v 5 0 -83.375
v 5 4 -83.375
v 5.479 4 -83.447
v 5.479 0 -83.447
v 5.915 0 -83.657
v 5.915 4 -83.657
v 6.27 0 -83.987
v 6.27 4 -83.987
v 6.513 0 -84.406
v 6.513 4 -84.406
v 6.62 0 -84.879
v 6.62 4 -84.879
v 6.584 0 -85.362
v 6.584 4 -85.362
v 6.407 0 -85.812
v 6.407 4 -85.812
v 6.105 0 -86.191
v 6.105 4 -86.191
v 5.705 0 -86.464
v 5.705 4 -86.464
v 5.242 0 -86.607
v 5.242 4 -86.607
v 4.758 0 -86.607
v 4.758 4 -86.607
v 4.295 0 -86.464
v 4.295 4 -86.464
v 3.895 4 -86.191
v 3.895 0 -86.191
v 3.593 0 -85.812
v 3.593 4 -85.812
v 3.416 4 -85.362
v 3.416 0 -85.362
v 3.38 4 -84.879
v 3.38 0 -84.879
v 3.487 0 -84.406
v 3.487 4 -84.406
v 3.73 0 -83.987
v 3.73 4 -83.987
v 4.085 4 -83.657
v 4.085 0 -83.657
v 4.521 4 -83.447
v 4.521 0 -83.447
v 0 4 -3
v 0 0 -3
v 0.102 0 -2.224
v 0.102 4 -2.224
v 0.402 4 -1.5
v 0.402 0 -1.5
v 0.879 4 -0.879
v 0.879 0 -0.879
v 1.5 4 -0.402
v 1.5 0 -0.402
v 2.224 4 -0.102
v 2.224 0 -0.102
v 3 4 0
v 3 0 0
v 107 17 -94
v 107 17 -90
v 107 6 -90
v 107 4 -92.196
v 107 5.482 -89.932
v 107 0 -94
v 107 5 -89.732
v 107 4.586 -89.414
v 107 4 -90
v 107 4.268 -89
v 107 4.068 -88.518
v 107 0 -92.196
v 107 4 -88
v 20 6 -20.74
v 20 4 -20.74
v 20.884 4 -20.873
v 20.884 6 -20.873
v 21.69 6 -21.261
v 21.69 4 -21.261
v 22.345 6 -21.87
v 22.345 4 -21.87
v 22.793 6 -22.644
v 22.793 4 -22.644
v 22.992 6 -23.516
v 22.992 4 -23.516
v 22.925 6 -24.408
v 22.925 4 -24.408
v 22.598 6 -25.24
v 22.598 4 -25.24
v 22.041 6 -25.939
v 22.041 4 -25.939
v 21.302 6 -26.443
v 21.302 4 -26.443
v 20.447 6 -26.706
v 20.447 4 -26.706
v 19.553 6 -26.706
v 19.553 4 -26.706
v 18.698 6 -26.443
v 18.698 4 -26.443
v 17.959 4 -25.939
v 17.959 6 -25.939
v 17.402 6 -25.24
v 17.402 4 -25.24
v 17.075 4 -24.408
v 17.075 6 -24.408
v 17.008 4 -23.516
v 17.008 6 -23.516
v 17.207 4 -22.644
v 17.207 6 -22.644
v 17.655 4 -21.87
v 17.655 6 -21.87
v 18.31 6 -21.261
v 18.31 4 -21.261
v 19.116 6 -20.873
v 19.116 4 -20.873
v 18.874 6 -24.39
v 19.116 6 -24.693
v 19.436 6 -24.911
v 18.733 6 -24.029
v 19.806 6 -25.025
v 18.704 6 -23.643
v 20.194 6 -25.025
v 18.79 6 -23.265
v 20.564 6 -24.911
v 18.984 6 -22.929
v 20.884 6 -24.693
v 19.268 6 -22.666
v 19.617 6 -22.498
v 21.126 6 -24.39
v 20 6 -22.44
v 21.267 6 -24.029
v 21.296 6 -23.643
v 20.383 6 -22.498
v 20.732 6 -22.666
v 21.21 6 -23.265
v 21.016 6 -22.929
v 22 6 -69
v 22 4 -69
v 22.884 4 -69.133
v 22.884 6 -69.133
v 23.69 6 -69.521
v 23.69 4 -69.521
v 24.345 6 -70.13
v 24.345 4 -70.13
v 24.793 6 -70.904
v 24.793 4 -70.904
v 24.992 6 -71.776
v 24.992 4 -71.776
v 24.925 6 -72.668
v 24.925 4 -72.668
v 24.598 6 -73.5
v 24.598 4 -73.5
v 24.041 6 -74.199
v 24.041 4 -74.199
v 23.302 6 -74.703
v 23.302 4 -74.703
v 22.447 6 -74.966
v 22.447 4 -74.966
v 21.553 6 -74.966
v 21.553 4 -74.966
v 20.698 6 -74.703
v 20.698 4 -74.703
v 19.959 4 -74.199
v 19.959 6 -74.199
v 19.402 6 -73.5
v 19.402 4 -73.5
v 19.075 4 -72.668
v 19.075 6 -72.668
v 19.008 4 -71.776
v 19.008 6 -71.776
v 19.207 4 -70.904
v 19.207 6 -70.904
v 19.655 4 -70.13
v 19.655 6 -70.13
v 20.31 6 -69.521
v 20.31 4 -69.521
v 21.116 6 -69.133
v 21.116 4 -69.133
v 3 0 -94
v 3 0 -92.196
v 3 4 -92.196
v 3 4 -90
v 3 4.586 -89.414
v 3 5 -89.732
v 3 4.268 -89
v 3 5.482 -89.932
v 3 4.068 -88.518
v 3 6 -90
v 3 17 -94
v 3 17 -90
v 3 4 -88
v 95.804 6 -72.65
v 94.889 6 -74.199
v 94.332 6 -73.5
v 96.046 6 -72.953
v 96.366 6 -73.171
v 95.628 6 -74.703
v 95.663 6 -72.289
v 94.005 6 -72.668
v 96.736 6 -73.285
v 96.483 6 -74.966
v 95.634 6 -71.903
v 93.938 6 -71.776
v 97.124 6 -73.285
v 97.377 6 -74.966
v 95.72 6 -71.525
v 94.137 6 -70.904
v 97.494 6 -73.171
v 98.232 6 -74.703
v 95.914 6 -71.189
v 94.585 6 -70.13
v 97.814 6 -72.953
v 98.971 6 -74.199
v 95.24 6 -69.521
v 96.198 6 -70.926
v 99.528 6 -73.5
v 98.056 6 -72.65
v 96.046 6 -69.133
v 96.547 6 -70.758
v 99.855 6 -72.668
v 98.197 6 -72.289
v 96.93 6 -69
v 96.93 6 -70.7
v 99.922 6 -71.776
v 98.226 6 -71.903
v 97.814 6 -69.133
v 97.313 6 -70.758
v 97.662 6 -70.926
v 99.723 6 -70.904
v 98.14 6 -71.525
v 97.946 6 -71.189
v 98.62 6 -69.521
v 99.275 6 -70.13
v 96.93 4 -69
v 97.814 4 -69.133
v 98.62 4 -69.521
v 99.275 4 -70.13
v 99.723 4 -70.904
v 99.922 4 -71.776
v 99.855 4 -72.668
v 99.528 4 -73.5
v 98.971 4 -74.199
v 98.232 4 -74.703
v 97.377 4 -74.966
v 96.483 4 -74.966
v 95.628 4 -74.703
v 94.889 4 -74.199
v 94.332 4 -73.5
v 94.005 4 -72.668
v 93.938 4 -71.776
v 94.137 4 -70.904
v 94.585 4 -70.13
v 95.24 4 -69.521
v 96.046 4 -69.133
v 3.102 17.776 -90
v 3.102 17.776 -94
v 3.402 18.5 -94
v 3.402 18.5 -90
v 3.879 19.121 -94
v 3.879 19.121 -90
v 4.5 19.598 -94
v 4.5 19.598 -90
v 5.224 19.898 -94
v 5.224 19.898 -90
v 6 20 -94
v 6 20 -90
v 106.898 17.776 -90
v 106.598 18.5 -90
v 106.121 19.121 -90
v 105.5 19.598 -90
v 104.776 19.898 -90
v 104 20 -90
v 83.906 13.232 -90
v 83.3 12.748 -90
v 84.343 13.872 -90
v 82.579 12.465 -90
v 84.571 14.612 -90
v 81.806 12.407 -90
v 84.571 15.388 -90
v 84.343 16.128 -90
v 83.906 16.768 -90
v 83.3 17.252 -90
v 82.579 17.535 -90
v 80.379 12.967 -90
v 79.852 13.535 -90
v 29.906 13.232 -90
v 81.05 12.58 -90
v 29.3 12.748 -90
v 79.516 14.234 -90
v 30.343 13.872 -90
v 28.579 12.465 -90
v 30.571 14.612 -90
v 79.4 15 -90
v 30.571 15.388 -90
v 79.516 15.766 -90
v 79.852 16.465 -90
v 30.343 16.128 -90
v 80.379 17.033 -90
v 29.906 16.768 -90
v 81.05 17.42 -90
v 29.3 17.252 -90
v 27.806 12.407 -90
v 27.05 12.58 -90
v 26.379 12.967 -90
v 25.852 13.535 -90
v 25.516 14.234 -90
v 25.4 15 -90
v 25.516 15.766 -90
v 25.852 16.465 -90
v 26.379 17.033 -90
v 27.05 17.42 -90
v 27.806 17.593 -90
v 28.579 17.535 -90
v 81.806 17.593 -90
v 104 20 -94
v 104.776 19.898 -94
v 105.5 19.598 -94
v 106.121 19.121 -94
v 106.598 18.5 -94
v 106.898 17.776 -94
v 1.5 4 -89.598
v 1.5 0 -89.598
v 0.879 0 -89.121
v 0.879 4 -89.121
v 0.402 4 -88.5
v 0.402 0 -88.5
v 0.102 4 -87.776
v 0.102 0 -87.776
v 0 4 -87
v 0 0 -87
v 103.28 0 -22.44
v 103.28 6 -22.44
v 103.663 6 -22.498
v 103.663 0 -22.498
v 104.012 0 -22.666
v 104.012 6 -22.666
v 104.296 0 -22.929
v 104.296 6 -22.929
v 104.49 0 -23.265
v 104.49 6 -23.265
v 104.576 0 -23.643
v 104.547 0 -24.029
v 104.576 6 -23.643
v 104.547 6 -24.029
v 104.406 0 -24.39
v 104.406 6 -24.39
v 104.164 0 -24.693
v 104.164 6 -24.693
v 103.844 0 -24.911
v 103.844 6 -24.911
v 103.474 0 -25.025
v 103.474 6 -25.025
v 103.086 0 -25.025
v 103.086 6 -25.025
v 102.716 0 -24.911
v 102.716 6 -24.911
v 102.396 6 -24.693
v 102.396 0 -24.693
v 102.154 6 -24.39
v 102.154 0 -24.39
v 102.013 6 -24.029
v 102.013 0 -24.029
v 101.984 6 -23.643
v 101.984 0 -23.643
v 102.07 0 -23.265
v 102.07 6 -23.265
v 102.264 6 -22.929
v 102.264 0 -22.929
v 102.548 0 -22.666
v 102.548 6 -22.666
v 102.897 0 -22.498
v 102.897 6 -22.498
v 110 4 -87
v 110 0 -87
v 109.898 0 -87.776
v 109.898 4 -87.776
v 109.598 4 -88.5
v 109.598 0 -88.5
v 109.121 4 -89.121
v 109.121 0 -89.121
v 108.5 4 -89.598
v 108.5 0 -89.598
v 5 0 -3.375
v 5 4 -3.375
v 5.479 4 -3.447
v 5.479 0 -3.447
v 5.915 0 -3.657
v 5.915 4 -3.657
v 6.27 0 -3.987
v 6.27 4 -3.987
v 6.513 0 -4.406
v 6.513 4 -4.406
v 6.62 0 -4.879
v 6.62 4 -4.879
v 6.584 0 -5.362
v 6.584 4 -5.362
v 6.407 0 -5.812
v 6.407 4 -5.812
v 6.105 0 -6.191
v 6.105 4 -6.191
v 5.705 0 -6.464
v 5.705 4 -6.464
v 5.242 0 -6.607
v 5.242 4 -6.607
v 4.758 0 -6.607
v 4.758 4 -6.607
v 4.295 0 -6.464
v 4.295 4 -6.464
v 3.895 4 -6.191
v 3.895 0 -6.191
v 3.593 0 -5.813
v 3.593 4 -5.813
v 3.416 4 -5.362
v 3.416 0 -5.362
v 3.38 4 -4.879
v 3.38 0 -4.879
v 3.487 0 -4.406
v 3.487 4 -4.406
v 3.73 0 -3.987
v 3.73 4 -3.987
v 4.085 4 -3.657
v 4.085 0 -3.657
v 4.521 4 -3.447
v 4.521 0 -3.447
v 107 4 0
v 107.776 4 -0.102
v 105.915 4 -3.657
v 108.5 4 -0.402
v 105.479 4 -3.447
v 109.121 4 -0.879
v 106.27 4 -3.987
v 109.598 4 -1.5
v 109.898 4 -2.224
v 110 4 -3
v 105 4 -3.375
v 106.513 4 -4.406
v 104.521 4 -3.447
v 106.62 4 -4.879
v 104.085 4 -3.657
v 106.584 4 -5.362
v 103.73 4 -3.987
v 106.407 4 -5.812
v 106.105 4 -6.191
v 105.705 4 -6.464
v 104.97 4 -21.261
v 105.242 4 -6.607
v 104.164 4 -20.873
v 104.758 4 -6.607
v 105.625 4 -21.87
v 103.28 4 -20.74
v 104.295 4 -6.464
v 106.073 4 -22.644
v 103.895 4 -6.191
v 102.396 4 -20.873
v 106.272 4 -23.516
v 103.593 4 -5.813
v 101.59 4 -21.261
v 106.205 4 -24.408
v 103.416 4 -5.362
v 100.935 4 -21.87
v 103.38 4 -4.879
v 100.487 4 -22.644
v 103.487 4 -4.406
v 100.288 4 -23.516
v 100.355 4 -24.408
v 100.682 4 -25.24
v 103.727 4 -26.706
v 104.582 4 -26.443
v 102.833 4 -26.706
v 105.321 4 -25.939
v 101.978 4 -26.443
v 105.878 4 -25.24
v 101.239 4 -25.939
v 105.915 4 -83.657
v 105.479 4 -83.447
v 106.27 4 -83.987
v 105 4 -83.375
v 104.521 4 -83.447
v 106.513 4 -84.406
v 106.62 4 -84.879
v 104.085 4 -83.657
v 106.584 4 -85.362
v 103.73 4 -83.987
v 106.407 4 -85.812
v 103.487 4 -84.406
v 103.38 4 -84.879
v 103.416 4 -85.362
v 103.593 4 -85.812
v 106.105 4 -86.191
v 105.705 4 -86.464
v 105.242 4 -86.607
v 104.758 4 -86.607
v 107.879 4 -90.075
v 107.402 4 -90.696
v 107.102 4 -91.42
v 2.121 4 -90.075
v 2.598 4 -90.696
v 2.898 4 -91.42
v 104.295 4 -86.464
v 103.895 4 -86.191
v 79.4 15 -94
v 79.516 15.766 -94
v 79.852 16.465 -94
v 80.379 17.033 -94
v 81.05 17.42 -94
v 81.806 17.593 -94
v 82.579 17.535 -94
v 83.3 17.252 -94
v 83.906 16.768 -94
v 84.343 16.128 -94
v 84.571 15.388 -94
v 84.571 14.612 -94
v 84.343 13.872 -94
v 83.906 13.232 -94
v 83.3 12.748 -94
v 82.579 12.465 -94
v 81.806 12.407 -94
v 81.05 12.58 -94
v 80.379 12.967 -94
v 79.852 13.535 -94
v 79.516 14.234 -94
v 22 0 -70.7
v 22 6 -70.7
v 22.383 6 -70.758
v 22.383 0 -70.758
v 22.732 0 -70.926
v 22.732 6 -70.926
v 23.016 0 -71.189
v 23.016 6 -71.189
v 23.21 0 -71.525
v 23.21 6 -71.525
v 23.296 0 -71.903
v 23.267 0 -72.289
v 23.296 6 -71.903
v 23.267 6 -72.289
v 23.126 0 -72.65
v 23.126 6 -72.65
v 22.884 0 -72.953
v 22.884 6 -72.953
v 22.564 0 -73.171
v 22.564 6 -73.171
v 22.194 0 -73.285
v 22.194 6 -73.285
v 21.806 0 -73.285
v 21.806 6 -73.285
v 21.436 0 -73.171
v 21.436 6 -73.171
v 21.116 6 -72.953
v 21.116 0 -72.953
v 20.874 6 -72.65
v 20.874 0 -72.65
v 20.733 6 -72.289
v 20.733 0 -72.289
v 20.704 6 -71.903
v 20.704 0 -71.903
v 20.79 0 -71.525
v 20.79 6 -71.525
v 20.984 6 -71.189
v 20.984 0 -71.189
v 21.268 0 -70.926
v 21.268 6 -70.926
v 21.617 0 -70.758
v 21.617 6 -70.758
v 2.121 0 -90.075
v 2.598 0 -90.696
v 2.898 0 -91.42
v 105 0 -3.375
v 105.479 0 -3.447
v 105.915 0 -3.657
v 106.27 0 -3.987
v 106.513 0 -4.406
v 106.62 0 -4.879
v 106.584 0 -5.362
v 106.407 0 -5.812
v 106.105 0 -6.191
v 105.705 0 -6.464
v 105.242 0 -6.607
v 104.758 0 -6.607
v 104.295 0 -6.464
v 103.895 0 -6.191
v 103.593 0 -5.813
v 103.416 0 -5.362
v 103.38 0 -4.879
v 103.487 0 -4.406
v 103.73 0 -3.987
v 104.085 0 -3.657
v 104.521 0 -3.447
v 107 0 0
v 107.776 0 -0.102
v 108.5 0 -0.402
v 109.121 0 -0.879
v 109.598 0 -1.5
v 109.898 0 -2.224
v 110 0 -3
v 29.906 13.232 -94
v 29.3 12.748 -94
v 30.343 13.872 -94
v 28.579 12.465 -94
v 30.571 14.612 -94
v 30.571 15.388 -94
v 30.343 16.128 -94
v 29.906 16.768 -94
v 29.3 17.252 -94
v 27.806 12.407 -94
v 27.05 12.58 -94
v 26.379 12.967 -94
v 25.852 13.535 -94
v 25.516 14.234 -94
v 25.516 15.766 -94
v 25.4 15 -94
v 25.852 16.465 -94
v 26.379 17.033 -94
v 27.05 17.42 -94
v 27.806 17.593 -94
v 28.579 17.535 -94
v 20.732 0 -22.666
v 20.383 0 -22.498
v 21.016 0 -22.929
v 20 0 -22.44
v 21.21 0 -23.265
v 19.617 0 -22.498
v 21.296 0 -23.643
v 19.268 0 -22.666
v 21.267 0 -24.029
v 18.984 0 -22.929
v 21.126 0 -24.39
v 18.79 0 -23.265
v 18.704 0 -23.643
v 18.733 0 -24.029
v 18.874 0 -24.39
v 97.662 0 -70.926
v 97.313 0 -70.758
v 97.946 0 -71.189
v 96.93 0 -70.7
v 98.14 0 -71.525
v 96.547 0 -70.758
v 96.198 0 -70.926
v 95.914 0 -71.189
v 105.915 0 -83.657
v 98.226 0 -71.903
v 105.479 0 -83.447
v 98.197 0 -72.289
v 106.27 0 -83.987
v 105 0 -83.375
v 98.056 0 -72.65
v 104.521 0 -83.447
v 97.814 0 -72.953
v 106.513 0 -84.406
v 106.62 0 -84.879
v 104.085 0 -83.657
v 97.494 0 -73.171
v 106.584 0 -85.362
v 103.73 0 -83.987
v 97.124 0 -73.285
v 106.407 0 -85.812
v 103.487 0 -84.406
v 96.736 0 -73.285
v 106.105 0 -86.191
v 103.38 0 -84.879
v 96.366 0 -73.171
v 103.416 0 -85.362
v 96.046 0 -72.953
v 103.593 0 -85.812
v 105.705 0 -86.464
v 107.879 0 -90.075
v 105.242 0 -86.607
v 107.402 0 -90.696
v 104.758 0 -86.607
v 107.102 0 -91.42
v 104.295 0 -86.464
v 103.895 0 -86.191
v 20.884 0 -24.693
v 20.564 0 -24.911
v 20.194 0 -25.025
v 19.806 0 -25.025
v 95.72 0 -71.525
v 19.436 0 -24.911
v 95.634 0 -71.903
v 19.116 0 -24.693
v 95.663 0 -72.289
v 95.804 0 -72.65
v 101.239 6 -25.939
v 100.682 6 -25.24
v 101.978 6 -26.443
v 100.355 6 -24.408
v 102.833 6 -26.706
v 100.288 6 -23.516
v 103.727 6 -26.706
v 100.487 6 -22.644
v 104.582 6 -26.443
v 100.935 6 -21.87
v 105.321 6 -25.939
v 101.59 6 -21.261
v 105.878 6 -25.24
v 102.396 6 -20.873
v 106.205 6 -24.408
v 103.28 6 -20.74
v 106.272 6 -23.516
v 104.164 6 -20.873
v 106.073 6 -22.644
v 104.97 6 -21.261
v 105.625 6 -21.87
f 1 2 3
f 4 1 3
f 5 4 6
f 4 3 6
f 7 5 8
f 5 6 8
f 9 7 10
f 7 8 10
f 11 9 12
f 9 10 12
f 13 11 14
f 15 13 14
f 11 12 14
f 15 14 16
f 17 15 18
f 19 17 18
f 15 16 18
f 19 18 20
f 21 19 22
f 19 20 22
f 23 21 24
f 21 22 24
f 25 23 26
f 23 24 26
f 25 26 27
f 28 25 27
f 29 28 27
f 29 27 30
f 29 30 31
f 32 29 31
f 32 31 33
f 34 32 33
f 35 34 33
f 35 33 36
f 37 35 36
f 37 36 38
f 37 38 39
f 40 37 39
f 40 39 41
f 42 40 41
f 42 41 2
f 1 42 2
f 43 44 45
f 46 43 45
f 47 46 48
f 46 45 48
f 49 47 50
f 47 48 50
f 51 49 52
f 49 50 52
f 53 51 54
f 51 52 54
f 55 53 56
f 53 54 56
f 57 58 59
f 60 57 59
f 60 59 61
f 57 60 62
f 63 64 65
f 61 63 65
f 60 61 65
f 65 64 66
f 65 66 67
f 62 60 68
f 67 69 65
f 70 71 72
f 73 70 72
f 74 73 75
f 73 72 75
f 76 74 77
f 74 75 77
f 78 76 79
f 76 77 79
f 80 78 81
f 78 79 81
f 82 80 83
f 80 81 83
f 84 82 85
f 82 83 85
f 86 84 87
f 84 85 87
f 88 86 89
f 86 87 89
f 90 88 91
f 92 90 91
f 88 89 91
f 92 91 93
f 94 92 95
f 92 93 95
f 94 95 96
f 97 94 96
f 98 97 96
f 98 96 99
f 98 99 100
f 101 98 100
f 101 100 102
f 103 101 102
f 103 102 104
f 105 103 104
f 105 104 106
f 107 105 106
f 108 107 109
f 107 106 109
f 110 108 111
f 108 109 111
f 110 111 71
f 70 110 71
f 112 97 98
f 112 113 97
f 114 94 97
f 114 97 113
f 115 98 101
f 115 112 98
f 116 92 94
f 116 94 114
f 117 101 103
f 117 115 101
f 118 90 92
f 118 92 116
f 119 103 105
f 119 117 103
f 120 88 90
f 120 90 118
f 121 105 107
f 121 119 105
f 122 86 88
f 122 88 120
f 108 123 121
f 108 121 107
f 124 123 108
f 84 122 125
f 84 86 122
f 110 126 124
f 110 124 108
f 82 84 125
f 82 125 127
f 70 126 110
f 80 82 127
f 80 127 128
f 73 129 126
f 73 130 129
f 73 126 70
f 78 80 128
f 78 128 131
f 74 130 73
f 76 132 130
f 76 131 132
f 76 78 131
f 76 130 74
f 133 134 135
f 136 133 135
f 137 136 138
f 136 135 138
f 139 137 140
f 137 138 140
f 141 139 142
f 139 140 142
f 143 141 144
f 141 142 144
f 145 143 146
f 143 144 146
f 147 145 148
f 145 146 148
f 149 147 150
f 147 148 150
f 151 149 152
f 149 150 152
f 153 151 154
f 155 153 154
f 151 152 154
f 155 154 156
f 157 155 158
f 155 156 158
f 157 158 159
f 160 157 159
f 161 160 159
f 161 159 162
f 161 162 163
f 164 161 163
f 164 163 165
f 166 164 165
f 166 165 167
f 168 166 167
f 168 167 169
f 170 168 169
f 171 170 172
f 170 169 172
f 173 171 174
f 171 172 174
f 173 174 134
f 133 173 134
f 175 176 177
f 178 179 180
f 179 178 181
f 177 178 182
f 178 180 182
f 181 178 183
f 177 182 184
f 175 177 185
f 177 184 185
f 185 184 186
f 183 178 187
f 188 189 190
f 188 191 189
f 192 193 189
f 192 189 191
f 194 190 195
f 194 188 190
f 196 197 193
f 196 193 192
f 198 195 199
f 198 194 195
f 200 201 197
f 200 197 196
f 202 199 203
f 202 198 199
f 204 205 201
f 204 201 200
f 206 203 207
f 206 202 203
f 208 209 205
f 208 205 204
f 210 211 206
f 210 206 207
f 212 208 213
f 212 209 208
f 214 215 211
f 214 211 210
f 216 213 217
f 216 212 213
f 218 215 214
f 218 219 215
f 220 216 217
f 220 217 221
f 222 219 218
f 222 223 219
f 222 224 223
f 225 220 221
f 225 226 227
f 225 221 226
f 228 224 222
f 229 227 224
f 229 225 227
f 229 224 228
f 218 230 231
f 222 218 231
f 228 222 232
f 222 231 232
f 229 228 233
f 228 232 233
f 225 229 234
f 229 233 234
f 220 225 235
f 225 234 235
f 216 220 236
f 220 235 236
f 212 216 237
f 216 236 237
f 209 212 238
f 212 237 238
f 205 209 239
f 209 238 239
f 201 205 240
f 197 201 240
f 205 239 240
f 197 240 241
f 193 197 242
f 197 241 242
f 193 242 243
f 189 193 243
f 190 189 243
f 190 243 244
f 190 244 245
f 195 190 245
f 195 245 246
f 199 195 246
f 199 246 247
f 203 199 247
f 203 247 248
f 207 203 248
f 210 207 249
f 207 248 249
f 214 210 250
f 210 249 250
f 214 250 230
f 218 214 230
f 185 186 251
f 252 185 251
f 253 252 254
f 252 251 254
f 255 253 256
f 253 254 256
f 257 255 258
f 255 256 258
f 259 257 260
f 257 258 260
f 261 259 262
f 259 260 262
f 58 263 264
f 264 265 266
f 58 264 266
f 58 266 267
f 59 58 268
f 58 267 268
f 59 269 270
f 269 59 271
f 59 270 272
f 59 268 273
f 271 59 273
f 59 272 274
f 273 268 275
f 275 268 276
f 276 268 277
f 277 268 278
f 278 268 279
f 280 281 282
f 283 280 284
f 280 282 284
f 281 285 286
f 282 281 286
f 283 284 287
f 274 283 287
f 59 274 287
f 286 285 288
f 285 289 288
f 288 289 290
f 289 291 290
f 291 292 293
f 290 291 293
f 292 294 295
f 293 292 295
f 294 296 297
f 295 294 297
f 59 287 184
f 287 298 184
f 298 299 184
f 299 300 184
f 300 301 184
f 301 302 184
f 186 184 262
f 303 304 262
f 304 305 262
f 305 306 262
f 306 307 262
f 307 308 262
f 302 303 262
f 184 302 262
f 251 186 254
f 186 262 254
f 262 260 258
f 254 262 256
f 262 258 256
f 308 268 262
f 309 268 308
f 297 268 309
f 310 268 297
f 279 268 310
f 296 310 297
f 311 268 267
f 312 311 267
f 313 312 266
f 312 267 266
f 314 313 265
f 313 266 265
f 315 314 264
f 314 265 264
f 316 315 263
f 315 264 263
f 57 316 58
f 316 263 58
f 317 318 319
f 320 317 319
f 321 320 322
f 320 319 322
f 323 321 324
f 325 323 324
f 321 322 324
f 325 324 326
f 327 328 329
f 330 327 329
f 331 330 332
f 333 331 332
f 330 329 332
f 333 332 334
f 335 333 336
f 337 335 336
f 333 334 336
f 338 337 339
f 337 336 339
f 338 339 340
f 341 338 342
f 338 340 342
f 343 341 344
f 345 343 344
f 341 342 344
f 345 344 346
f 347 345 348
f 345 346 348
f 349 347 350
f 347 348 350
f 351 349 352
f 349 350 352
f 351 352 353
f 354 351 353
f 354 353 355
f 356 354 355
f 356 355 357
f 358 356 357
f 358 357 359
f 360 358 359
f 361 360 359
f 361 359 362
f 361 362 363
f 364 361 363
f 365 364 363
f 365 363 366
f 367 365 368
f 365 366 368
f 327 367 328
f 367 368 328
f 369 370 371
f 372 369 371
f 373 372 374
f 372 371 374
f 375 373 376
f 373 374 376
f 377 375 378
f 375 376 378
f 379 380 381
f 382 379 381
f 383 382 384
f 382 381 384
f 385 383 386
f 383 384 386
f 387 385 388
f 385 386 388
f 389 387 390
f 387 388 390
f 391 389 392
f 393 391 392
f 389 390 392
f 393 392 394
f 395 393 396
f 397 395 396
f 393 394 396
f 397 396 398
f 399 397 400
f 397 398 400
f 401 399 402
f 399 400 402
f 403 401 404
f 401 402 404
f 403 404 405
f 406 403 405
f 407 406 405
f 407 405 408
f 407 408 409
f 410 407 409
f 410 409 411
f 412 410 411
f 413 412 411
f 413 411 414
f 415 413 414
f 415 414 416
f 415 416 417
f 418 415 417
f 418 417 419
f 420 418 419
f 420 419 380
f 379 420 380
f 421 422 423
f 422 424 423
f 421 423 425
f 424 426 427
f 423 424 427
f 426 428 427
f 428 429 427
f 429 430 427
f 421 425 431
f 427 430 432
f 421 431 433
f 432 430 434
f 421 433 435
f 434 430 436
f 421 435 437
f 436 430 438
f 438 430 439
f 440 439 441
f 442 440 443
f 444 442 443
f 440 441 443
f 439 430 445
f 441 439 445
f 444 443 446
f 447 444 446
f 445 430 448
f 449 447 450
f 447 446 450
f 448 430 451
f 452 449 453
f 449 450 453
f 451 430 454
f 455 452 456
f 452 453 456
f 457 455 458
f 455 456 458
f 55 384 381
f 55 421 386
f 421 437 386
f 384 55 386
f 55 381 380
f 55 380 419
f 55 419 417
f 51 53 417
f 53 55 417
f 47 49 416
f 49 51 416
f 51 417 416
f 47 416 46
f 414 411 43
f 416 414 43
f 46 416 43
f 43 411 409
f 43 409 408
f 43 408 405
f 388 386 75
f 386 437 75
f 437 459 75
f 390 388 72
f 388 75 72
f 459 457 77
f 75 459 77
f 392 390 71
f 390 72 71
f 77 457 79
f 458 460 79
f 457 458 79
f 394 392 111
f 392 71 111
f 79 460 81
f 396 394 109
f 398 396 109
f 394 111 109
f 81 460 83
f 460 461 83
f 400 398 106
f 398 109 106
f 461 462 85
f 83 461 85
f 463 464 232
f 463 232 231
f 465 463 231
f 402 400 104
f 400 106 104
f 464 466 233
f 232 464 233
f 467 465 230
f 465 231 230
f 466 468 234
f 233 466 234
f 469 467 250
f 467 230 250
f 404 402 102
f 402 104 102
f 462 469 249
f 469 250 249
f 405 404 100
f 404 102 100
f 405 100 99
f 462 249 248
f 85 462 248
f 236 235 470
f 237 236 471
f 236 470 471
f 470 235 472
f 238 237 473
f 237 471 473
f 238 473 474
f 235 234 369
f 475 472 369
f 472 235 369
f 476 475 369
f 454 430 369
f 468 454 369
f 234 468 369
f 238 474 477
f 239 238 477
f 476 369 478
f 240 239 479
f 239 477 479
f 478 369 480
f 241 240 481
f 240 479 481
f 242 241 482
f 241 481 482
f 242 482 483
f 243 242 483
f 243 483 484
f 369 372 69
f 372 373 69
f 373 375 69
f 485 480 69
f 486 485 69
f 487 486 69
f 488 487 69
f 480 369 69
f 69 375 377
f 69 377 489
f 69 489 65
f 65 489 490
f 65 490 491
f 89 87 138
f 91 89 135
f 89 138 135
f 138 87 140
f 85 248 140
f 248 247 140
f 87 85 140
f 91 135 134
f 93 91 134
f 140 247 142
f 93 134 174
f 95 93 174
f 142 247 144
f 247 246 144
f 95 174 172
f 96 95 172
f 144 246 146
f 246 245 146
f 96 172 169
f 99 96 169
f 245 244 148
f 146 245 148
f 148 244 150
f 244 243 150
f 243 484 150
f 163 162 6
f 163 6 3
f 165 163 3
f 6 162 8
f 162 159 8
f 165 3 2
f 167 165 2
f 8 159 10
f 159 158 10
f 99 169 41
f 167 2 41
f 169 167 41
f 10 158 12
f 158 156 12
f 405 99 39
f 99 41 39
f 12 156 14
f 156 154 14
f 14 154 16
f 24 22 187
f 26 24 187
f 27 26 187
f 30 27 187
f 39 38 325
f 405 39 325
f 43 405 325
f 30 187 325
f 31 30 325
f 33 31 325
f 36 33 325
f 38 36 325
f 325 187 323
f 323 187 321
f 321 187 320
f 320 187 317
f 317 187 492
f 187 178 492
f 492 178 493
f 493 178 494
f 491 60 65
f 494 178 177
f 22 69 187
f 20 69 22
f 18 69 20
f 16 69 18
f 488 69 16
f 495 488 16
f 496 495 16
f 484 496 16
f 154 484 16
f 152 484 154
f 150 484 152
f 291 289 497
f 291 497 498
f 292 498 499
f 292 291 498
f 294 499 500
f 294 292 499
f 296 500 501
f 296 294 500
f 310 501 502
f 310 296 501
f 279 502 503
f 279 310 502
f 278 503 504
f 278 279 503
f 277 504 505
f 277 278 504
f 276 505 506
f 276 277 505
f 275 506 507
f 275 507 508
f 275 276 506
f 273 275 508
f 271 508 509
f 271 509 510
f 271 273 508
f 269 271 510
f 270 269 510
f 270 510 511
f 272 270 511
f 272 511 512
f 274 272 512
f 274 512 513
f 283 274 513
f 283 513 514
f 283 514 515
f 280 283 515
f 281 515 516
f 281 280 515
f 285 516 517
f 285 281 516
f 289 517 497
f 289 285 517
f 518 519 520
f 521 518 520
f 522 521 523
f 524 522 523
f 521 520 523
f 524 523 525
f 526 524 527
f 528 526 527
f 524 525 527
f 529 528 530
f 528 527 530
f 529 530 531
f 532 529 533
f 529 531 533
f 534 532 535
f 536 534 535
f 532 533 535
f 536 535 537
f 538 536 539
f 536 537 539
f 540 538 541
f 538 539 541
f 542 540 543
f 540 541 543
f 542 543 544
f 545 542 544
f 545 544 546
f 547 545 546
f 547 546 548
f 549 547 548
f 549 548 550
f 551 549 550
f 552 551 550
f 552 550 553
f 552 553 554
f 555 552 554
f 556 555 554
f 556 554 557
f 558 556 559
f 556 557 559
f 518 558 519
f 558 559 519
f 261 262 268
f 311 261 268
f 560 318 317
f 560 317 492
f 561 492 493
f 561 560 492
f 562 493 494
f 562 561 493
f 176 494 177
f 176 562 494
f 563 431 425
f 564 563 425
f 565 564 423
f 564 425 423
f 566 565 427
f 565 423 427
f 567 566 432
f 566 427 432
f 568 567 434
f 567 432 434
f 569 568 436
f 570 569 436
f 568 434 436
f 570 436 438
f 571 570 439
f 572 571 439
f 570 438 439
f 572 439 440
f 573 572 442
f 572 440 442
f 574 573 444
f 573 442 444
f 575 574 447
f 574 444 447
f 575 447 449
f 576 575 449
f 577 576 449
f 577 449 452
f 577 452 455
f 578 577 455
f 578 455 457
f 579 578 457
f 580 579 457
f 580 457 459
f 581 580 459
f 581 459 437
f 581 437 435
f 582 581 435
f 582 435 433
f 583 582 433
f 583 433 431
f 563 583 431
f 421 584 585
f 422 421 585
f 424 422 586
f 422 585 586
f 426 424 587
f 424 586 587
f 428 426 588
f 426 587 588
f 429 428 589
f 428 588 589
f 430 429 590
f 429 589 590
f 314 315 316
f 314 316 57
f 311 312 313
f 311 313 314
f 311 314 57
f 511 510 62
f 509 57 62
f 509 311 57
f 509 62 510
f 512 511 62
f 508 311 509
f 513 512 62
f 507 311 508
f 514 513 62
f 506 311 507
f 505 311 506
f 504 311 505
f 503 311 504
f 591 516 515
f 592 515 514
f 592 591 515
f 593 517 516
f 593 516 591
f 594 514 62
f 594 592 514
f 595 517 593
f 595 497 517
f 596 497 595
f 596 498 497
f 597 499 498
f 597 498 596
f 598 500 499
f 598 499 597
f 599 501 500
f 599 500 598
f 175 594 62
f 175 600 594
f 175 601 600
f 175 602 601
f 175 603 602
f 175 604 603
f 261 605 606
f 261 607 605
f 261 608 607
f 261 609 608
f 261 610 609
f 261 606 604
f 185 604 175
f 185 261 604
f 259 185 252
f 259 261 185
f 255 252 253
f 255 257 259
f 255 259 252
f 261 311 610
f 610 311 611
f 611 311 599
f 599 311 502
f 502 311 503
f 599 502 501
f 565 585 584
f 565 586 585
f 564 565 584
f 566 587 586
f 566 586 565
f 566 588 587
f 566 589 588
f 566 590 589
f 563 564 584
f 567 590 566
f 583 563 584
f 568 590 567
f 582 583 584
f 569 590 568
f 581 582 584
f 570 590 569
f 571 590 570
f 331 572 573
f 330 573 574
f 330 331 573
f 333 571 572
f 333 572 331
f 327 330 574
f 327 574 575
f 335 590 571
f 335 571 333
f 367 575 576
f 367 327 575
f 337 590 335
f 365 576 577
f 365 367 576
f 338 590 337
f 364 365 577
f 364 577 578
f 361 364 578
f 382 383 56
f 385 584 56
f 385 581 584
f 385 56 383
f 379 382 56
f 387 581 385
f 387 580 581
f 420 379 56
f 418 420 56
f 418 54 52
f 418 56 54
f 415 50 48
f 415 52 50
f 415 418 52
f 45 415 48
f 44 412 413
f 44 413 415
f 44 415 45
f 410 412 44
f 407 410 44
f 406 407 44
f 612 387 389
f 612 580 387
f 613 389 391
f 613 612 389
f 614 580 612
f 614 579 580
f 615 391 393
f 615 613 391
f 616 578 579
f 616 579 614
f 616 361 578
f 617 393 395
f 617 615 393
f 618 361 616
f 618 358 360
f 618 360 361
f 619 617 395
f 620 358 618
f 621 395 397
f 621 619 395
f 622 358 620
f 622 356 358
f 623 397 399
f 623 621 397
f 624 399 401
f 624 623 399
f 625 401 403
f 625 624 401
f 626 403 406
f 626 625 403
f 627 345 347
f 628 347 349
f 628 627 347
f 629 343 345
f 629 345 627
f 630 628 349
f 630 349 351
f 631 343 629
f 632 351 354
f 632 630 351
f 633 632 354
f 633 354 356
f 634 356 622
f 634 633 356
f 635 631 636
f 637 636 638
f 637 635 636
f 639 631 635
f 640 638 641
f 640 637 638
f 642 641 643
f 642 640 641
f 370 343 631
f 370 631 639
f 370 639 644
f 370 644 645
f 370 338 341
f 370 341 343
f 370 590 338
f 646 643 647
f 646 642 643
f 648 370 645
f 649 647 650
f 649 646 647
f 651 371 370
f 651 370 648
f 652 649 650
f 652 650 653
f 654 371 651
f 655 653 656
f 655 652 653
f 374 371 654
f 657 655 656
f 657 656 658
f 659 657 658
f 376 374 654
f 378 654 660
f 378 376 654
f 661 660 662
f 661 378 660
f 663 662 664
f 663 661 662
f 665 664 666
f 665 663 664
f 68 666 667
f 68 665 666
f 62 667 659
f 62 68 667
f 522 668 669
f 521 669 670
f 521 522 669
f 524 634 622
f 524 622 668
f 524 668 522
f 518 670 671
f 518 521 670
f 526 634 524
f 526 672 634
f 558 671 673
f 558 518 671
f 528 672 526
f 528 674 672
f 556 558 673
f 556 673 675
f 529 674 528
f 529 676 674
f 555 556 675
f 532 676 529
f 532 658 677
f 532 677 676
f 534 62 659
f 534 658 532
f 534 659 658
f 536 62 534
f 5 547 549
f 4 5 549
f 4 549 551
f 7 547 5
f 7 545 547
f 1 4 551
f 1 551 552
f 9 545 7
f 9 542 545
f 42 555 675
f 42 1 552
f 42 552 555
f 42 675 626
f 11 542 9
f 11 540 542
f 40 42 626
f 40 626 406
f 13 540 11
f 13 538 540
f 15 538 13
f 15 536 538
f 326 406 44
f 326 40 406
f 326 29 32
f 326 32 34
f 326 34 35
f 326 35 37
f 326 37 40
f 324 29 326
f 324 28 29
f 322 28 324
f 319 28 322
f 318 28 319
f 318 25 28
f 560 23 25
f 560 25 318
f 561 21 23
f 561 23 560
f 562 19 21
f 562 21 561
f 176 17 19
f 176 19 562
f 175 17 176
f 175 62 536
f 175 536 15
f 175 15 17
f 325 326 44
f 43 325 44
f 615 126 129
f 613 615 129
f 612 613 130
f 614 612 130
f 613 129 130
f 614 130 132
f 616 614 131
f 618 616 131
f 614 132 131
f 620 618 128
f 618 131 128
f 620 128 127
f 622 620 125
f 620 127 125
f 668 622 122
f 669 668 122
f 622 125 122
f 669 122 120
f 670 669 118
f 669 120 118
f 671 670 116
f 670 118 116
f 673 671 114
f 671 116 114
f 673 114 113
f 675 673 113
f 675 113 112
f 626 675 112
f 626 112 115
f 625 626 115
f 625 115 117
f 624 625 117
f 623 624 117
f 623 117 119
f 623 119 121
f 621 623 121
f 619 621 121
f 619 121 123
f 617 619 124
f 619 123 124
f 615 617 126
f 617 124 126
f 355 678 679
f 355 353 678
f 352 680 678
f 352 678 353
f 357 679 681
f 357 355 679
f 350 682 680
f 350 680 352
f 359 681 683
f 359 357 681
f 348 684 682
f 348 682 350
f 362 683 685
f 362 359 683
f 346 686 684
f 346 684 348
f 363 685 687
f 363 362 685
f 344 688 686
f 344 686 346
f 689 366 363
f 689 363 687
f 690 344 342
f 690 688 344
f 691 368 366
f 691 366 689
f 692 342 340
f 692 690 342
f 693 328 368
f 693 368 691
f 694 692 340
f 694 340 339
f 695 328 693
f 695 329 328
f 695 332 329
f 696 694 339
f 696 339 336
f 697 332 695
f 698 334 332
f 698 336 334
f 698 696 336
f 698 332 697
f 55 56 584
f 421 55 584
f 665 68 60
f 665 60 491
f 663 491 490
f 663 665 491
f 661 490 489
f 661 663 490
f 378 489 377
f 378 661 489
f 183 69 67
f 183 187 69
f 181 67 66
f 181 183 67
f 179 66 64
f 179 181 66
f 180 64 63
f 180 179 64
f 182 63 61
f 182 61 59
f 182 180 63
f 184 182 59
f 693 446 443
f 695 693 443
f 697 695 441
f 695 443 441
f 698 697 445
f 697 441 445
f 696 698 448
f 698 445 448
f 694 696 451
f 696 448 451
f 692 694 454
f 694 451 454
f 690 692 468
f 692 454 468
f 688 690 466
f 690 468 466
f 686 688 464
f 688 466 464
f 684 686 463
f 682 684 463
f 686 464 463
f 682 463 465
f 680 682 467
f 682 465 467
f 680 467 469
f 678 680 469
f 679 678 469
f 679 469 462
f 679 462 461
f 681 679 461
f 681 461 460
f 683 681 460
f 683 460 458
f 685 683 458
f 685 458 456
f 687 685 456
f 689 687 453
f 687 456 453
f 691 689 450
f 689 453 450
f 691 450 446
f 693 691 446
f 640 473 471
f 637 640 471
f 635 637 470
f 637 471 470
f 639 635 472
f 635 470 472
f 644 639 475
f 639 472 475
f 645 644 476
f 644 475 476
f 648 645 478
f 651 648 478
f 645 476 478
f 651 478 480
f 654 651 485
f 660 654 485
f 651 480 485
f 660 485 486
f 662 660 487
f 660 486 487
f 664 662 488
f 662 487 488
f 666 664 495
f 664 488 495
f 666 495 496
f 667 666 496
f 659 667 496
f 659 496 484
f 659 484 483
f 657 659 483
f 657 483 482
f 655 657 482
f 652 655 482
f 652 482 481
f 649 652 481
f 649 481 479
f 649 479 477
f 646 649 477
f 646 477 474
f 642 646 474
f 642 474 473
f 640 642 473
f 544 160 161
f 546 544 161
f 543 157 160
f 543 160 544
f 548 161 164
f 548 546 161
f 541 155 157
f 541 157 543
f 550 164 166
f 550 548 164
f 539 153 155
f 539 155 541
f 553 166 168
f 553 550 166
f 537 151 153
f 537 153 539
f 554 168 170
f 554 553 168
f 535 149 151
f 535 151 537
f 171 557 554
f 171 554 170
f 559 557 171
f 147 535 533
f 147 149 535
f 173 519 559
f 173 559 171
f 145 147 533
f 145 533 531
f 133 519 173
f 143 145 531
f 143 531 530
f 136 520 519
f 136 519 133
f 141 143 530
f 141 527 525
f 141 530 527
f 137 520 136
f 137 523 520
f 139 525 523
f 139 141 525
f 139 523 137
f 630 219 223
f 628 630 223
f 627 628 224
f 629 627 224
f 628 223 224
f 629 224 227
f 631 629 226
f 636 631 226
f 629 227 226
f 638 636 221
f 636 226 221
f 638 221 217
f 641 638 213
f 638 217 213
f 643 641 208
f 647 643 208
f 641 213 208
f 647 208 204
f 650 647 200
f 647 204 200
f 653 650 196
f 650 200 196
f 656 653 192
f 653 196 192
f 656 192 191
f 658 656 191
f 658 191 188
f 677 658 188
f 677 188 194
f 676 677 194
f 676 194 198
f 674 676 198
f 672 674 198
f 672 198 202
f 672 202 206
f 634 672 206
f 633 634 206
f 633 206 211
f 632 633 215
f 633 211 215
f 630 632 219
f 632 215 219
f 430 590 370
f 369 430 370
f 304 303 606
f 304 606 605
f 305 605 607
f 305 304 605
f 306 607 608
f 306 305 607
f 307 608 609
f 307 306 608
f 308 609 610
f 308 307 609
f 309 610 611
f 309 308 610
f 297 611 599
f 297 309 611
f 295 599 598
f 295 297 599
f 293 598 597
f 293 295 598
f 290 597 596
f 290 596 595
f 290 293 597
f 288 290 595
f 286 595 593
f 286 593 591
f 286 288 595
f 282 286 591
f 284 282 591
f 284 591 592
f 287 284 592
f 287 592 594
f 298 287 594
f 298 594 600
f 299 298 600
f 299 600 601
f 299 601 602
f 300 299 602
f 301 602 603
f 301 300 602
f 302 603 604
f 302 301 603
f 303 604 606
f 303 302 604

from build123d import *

# Parameters (mm, degrees)
BOSS_EXTRUDE1_DEPTH = 4
SKETCH2_R           = 3
BOSS_EXTRUDE2_DEPTH = 2
SKETCH3_R           = 1.3
CUT_EXTRUDE1_DEPTH  = 6
SKETCH4_R           = 2.6
BOSS_EXTRUDE3_DEPTH = 4
FILLET1_R           = 3
FILLET2_R           = 2
SKETCH5_R           = 1.625
CUT_EXTRUDE2_DEPTH  = 10


with BuildPart() as part:
    # Sketch1 → Boss-Extrude1 (new body)
    with BuildSketch(Plane(origin=(0, 0, 0), x_dir=(1, 0, 0), z_dir=(0, 1, 0))):
        with BuildLine():
            Line((3, 0), (107, 0))
            ThreePointArc((107, 0), (109.121320344, 0.878679656), (110, 3))
            Line((110, 3), (110, 87))
            ThreePointArc((110, 87), (109.121320344, 89.121320344), (107, 90))
            Line((107, 90), (3, 90))
            ThreePointArc((3, 90), (0.878679656, 89.121320344), (0, 87))
            Line((0, 87), (0, 3))
            ThreePointArc((0, 3), (0.878679656, 0.878679656), (3, 0))
        make_face()
    extrude(amount=BOSS_EXTRUDE1_DEPTH)

    # Sketch2 → Boss-Extrude2 (add)
    with BuildSketch(Plane(origin=(0, 4, 0), x_dir=(1, 0, 0), z_dir=(0, 1, 0))):
        with Locations(Location((22, 72, 0), (0, 0, 270))):
            Circle(SKETCH2_R)
        with Locations(Location((103.28, 23.74, 0), (0, 0, 270))):
            Circle(SKETCH2_R)
        with Locations(Location((96.93, 72, 0), (0, 0, 270))):
            Circle(SKETCH2_R)
        with Locations(Location((20, 23.74, 0), (0, 0, 270))):
            Circle(SKETCH2_R)
    extrude(amount=BOSS_EXTRUDE2_DEPTH)

    # Sketch3 → Cut-Extrude1 (cut)
    with BuildSketch(Plane(origin=(0, 6, 0), x_dir=(1, 0, 0), z_dir=(0, 1, 0))):
        with Locations(Location((22, 72, 0), (0, 0, 270))):
            Circle(SKETCH3_R)
        with Locations(Location((96.93, 72, 0), (0, 0, 270))):
            Circle(SKETCH3_R)
        with Locations(Location((103.28, 23.74, 0), (0, 0, 270))):
            Circle(SKETCH3_R)
        with Locations(Location((20, 23.74, 0), (0, 0, 270))):
            Circle(SKETCH3_R)
    extrude(amount=-CUT_EXTRUDE1_DEPTH, mode=Mode.SUBTRACT)

    # Sketch4 → Boss-Extrude3 (add)
    with BuildSketch(Plane(origin=(0, 0, -90), x_dir=(-1, 0, 0), z_dir=(0, 0, -1))):
        with BuildLine():
            Line((-107, 0), (-3, 0))
            Line((-3, 0), (-3, 17))
            ThreePointArc((-3, 17), (-3.878679656, 19.121320344), (-6, 20))
            Line((-6, 20), (-104, 20))
            ThreePointArc((-104, 20), (-106.121320344, 19.121320344), (-107, 17))
            Line((-107, 17), (-107, 0))
        make_face()
        with Locations((-82, 15)):
            Circle(SKETCH4_R, mode=Mode.SUBTRACT)
        with Locations((-28, 15)):
            Circle(SKETCH4_R, mode=Mode.SUBTRACT)
    extrude(amount=BOSS_EXTRUDE3_DEPTH)

    # Fillet1
    # the kernel refuses this fillet: 3 mm, written as the material it adds along each edge
    with BuildSketch(Plane(origin=(3, 0, -90), x_dir=(-0.9659258262890682, 0, 0.25881904510252113), z_dir=(0, 1, 0))) as fillet1_piece_1:
        with BuildLine():
            CenterArc((2.329371406, -2.897777479), FILLET1_R, 105, 60)
            Line((-0.568406073, -2.121320344), (0, 0))
            ThreePointArc((0, 0), (0.776457135, -0.102222521), (1.552914271, 0))
        make_face()
    extrude(amount=4)
    with BuildSketch(Plane(origin=(107, 0, -90), x_dir=(0.9659258262890682, 0, 0.2588190451025207), z_dir=(0, 1, 0))) as fillet1_piece_2:
        with BuildLine():
            CenterArc((2.329371406, 2.897777479), FILLET1_R, 195, 60)
            Line((-0.568406073, 2.121320344), (0, 0))
            ThreePointArc((0, 0), (0.776457135, 0.102222521), (1.552914271, 0))
        make_face()
    extrude(amount=4)

    # Fillet2
    fillet2_edges = [part.edges().sort_by_distance(p)[0] for p in [
        (55, 4, -90),
    ]]
    fillet(fillet2_edges, radius=FILLET2_R)

    # Sketch5 → Cut-Extrude2 (cut)
    with BuildSketch(Plane(origin=(0, 4, 0), x_dir=(1, 0, 0), z_dir=(0, 1, 0))):
        with Locations(Location((5, 85, 0), (0, 0, 270))):
            Circle(SKETCH5_R)
        with Locations(Location((105, 85, 0), (0, 0, 270))):
            Circle(SKETCH5_R)
        with Locations(Location((105, 5, 0), (0, 0, 270))):
            Circle(SKETCH5_R)
        with Locations(Location((5, 5, 0), (0, 0, 270))):
            Circle(SKETCH5_R)
    extrude(amount=-CUT_EXTRUDE2_DEPTH, mode=Mode.SUBTRACT)


solid = part.part
